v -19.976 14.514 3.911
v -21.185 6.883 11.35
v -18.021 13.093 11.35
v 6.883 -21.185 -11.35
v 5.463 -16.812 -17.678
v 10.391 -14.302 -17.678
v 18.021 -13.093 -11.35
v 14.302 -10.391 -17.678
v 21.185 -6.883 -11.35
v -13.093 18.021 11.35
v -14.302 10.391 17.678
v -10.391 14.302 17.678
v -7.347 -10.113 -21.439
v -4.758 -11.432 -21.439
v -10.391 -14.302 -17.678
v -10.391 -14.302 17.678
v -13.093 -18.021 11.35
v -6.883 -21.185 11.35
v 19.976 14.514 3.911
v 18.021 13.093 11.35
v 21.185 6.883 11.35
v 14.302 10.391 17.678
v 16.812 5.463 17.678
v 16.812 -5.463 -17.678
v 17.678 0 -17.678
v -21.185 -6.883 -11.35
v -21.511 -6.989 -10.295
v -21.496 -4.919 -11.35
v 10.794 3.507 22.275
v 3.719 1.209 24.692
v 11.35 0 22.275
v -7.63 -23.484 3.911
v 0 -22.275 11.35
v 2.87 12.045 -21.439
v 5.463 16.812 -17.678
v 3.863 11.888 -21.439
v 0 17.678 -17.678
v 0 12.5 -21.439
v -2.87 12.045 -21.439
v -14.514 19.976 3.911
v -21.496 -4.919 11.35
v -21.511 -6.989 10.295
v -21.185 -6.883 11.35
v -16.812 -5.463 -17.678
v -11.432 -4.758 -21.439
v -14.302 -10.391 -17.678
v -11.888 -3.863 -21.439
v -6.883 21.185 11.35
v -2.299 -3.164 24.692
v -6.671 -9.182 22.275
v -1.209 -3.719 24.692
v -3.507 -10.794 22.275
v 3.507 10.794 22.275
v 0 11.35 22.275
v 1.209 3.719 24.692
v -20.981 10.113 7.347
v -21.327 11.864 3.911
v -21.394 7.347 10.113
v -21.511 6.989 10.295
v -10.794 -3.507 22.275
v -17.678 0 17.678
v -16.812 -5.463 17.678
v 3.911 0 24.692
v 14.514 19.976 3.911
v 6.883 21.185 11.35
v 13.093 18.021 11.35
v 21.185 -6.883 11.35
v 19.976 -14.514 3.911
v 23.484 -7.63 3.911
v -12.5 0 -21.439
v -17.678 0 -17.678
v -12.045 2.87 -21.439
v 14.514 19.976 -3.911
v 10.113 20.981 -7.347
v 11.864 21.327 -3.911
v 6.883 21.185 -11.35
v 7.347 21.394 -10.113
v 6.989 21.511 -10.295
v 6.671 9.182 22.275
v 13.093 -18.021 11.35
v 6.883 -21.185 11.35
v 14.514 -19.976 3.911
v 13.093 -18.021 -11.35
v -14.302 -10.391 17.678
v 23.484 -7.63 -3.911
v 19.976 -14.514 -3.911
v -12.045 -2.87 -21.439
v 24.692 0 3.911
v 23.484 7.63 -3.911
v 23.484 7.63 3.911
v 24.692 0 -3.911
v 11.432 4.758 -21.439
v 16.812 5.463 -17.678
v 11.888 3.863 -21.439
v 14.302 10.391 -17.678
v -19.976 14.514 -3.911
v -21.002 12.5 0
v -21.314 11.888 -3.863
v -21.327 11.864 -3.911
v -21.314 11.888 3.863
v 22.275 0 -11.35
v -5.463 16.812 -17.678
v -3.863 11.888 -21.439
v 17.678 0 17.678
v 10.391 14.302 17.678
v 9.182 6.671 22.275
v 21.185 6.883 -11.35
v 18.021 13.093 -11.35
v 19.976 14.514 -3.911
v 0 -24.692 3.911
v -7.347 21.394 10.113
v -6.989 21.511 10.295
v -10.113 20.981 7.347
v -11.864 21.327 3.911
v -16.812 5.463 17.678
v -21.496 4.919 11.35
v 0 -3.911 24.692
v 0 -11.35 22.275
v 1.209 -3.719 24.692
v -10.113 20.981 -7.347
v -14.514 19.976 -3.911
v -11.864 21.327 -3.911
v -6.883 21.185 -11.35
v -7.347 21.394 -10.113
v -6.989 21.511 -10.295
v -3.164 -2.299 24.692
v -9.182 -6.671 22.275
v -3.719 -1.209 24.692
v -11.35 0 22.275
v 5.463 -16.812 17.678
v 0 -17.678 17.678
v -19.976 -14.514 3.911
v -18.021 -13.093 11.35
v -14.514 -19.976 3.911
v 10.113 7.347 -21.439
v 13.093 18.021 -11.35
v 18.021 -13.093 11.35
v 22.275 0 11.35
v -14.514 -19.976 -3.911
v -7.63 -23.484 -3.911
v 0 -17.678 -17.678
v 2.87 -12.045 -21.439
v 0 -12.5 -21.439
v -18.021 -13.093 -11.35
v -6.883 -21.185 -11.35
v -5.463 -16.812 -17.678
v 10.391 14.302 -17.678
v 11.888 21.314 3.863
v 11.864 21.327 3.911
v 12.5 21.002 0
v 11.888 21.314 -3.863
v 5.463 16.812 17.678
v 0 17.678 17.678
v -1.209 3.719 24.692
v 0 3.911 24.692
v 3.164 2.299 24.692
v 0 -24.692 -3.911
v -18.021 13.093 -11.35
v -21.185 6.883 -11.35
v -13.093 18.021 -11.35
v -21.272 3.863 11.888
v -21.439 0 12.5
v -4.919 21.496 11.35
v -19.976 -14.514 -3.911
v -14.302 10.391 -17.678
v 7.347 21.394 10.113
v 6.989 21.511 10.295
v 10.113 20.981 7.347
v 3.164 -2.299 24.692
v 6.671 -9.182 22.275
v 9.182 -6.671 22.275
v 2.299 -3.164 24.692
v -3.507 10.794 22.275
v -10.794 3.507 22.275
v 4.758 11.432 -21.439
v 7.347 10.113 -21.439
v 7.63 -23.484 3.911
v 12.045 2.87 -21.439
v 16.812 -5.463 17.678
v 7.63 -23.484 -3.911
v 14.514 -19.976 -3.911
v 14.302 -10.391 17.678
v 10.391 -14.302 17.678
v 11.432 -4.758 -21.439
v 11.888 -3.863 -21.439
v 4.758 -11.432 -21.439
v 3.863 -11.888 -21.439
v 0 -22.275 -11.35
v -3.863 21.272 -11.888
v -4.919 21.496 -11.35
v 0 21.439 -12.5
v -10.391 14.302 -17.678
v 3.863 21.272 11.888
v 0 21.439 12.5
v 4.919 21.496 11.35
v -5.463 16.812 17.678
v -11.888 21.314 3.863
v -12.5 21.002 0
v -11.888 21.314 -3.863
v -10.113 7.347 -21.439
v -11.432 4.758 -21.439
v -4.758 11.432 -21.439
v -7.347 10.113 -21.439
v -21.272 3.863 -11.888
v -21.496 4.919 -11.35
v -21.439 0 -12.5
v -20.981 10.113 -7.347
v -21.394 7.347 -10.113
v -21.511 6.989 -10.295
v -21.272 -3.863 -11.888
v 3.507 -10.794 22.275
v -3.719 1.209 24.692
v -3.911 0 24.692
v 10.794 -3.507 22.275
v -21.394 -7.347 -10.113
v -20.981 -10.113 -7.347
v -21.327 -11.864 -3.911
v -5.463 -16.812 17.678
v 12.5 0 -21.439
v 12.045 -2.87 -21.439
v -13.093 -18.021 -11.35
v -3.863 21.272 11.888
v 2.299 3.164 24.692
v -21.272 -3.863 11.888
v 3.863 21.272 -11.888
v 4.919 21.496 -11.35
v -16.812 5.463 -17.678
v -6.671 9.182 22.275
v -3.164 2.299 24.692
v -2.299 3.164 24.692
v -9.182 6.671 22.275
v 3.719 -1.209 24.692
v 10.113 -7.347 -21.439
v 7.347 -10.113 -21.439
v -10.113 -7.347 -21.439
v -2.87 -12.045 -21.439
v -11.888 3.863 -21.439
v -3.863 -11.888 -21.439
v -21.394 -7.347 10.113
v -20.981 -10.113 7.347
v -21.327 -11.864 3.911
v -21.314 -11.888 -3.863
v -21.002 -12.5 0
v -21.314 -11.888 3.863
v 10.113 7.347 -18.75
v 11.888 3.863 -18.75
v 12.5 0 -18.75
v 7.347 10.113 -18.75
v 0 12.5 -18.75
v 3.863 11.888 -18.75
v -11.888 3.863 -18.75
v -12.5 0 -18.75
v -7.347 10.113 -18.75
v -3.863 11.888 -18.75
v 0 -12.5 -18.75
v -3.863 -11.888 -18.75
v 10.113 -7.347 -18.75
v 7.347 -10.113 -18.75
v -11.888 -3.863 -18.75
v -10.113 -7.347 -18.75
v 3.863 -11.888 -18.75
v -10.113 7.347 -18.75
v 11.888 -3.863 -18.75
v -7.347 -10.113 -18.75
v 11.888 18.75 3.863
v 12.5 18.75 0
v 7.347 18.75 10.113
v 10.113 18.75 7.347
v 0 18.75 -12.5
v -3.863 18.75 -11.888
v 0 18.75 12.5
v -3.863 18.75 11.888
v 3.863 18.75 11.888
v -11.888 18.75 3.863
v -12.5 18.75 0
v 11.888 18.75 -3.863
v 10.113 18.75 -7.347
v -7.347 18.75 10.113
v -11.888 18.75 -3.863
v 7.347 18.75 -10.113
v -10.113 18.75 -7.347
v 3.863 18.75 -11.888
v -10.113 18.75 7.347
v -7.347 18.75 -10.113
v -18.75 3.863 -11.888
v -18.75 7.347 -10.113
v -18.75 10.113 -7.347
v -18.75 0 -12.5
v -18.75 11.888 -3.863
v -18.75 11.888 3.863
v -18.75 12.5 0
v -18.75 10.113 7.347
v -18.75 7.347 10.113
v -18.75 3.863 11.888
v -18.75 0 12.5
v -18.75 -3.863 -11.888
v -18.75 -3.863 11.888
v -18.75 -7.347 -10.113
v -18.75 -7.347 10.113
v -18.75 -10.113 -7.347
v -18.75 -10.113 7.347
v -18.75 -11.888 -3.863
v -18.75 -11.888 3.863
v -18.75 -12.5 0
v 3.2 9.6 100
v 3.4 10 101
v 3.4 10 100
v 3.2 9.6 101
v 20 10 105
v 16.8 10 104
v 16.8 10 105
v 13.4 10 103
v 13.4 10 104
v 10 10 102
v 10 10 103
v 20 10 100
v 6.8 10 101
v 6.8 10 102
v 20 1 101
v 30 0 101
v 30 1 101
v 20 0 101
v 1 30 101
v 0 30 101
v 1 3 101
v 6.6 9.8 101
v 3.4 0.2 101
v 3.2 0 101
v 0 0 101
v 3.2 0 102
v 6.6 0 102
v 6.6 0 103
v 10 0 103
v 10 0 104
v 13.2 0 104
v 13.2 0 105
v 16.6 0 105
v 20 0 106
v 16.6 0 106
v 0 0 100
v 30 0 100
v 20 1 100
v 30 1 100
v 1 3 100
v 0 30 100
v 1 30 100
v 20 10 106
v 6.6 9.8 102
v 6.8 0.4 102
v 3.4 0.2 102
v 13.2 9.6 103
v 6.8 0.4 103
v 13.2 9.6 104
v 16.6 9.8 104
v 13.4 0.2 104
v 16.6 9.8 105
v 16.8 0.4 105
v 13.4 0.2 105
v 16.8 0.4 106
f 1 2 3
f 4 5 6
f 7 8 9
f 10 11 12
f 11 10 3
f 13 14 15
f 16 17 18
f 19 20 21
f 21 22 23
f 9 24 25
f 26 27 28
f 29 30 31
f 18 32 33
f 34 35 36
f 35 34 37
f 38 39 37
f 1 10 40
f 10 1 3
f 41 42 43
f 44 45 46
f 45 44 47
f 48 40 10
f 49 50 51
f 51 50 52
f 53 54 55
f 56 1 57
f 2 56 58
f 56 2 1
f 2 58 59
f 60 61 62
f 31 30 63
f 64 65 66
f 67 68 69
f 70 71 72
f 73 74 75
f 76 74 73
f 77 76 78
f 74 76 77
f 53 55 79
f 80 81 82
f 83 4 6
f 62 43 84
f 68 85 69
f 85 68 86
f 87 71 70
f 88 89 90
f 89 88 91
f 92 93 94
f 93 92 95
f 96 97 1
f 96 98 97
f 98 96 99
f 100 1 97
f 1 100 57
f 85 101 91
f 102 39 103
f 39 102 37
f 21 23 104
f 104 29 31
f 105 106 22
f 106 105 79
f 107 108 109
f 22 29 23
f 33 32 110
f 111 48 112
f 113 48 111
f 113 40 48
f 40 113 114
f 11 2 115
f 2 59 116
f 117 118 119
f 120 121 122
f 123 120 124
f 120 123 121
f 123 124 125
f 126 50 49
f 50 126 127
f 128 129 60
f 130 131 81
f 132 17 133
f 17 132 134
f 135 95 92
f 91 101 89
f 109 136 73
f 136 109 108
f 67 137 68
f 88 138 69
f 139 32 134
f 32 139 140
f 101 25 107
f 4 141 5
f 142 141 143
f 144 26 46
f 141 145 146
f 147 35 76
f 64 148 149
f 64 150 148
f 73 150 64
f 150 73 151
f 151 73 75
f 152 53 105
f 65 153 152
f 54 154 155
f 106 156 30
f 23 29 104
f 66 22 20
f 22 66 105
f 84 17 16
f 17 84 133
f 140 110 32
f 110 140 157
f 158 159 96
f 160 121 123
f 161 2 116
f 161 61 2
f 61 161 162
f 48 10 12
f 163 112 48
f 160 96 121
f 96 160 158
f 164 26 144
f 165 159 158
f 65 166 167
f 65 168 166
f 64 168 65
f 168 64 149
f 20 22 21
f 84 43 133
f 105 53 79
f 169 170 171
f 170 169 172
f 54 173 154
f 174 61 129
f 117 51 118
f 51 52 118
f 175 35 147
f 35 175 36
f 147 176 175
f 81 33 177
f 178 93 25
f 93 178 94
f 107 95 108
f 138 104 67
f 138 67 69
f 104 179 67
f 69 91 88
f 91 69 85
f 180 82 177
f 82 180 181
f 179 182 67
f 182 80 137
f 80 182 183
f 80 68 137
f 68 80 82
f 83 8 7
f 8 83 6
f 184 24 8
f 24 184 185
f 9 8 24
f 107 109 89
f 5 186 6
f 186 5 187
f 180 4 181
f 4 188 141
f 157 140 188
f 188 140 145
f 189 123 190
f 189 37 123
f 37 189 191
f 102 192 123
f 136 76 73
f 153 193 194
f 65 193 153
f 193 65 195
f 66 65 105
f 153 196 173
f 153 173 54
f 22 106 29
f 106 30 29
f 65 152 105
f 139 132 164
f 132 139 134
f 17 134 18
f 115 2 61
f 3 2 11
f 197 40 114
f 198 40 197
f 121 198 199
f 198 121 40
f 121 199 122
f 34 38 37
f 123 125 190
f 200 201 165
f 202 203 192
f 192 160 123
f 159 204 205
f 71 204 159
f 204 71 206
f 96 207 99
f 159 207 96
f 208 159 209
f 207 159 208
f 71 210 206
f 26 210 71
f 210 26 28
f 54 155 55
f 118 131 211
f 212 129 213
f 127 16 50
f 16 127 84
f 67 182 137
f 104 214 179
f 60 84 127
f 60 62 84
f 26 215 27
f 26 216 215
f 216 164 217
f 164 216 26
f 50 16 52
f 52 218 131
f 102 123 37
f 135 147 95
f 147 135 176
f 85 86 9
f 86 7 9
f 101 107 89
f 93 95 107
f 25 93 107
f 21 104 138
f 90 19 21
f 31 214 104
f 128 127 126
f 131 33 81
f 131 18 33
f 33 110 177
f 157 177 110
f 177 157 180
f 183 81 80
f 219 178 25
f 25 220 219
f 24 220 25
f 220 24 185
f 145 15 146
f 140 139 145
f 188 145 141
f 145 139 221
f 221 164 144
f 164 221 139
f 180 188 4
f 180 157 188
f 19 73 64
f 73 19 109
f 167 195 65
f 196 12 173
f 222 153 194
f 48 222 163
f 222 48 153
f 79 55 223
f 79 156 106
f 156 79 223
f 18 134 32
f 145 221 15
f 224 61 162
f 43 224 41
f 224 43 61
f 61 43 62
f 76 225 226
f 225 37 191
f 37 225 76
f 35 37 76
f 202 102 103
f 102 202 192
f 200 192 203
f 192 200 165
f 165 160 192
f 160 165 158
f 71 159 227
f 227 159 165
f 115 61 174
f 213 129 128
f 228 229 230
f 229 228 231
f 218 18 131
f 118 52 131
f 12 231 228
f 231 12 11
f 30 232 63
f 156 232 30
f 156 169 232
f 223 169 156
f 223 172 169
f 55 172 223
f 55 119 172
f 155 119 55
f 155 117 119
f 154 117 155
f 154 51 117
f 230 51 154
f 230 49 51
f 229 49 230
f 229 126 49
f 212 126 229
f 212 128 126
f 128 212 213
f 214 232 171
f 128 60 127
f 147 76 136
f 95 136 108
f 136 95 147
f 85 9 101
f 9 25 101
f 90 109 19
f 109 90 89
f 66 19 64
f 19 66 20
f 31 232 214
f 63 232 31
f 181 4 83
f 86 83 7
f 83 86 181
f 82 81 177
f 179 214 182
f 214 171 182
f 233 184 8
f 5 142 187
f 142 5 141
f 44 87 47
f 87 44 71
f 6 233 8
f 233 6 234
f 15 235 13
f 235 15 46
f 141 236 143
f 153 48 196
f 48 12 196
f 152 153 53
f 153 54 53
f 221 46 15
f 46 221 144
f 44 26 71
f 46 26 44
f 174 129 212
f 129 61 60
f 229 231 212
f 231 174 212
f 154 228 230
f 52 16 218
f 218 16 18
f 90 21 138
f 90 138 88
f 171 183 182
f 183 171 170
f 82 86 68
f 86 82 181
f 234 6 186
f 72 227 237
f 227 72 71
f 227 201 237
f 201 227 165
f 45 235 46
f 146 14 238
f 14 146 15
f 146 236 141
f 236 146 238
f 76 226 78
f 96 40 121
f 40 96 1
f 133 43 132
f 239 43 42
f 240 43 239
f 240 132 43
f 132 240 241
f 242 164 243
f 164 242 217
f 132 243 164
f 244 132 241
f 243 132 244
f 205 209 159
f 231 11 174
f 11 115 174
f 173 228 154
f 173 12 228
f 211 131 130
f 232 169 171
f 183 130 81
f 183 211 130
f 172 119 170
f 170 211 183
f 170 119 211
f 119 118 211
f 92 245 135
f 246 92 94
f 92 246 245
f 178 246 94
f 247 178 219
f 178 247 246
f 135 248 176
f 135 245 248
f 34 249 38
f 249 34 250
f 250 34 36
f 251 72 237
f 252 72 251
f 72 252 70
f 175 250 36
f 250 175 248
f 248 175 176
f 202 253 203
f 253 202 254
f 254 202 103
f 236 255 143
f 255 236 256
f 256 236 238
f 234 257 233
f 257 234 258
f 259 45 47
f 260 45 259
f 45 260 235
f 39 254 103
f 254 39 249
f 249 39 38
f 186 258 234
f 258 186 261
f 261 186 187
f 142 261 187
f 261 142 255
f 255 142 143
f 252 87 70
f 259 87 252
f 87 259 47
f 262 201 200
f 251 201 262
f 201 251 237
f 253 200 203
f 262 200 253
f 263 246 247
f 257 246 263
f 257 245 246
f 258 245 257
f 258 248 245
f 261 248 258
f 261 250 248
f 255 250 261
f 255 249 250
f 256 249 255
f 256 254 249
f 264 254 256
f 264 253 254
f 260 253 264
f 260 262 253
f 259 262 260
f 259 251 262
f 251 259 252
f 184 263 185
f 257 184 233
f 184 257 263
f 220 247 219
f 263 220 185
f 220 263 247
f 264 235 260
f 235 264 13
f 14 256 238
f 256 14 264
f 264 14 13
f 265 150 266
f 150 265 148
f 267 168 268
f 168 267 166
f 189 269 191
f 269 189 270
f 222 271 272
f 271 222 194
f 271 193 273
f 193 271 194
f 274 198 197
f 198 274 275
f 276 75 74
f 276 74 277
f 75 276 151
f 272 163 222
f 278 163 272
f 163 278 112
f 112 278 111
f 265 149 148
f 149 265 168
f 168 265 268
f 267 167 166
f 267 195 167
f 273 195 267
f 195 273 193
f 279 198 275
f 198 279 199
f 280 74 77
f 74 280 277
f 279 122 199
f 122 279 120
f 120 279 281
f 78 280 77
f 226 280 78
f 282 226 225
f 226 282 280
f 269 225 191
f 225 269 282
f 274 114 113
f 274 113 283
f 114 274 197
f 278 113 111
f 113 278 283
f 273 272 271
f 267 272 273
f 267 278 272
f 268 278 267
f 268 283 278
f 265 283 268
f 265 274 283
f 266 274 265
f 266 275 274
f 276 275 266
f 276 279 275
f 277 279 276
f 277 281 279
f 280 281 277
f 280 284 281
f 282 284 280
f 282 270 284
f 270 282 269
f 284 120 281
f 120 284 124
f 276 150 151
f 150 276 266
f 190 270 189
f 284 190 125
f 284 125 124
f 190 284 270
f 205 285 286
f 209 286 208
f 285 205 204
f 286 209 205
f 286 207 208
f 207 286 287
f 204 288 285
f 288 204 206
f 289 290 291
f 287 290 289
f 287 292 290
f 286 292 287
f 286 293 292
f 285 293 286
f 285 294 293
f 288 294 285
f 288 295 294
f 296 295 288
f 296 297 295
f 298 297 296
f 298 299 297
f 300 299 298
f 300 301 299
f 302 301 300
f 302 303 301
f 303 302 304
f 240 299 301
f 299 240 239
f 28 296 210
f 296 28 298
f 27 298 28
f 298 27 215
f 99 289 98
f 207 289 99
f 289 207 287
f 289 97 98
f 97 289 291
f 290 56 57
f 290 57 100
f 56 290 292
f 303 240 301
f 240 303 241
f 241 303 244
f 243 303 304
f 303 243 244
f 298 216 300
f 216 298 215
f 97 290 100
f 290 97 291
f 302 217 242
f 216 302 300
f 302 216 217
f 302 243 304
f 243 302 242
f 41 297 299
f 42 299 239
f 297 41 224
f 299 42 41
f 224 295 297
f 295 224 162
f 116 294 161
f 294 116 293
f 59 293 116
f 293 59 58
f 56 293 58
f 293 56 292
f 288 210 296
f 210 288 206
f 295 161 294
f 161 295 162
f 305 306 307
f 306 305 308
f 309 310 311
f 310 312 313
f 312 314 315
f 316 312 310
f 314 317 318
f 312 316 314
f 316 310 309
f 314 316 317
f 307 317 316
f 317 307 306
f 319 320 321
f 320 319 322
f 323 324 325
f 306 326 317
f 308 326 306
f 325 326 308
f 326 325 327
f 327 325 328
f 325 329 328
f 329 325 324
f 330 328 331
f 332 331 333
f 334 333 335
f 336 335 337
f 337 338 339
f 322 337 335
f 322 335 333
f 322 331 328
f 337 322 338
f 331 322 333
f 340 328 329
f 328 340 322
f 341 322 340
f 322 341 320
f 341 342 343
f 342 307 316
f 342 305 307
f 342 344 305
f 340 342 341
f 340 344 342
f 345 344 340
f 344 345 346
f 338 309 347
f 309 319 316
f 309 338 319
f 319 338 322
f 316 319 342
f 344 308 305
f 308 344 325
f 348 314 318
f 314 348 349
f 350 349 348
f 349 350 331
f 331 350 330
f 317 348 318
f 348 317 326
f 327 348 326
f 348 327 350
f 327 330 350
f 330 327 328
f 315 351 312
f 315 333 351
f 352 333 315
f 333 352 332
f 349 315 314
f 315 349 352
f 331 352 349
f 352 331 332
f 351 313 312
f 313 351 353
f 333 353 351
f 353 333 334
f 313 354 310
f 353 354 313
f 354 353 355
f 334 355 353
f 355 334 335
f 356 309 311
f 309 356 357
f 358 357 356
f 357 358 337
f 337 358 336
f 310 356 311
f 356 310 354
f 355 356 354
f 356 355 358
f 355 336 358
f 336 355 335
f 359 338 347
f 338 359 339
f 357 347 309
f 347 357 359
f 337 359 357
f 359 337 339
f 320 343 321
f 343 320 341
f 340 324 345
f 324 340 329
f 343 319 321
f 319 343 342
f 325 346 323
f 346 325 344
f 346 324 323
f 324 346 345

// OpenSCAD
// file: hsv.scad
function hsv(h, s = 1, v = 1, a = 1, p, q, t) = (p == undef || q == undef || t == undef)
    ? hsv(
        (h % 1) * 6,
        s < 0?0:s > 1?1:s,
        v < 0?0:v > 1?1:v,
    a,
        (v < 0?0:v > 1?1:v) * (1 - (s < 0?0:s > 1?1:s)),
        (v < 0?0:v > 1?1:v) * (1 - (s < 0?0:s > 1?1:s) * ((h % 1) * 6 - floor((h % 1) * 6))),
        (v < 0?0:v > 1?1:v) * (1 - (s < 0?0:s > 1?1:s) * (1 - ((h % 1) * 6 - floor((h % 1) * 6))))
    )
    :
            h < 1 ? [v, t, p, a] :
                    h < 2 ? [q, v, p, a] :
                            h < 3 ? [p, v, t, a] :
                                    h < 4 ? [p, q, v, a] :
                                            h < 5 ? [t, p, v, a] :
                                                    [v, p, q, a];
// file: time_steps.scad
function t_steps(t, nb_step) = [
    for (step = [0:nb_step-1])
        (t <= step / nb_step)
        ? 0
        : ((t >= (step+1) / nb_step)
            ? 1
            : (t - (step / nb_step)) * nb_step)
    ];

function time_steps(nb_step) =  t_steps($t, nb_step);
// main file
use <time_steps.scad>;
use <hsv.scad>
$fn=20;

_tests();
Logo(50);
graph_steps(6);

module Logo(size=50) {
    // Temporary variables
    hole = size/2;
    cylinderHeight = size * 1.25;
    t = time_steps(3);
    difference() {
        sphere(d=size);
        rotate([ 0, 0, 0]) translate([0, 0, -(1-t[0])*size]) #cylinder(d=hole, h=cylinderHeight, center=true);
        rotate([90, 0, 0]) translate([0, 0, -(1-t[1])*size]) #cylinder(d=hole, h=cylinderHeight, center=true);
        rotate([0, 90, 0]) translate([0, 0, -(1-t[2])*size]) #cylinder(d=hole, h=cylinderHeight, center=true);
    }
}

module graph_steps(nb_step) {
    translate([0,0,100]) {
        cube([30, 1, 1]);
        cube([1, 30, 1]);
        scale([20, 10, 1]) {
            for (step = [0:nb_step - 1]) {
                color(hsv(step / nb_step, 1, 1))
                    translate([0, 0, step]) linear_extrude(1) graph(step, nb_step);
            }
        }
    }
}

module graph(step, nb_steps) {
    points = [ for (x = [0:0.01:1]) [x, t_steps(x, nb_steps)[step]] ];
    newPoints = concat(points, [[1,0],[0,0]]);
    polygon(newPoints);
}

module _tests() {
    test(0.2, 4, [0.8,0,0,0]);
    test(0.4, 4, [1,0.6,0,0]);
    test(0.6, 4, [1,1,0.4,0]);
    test(0.8, 4, [1,1,1,0.2]);
    echo("test success");
}

module test(t, nb_step, expected_result) {
    actual = t_steps(t, nb_step);
    assert(str(actual) == str(expected_result), str("t_steps(",t, ",",nb_step,") should be ", expected_result, " but is ", actual));
}
